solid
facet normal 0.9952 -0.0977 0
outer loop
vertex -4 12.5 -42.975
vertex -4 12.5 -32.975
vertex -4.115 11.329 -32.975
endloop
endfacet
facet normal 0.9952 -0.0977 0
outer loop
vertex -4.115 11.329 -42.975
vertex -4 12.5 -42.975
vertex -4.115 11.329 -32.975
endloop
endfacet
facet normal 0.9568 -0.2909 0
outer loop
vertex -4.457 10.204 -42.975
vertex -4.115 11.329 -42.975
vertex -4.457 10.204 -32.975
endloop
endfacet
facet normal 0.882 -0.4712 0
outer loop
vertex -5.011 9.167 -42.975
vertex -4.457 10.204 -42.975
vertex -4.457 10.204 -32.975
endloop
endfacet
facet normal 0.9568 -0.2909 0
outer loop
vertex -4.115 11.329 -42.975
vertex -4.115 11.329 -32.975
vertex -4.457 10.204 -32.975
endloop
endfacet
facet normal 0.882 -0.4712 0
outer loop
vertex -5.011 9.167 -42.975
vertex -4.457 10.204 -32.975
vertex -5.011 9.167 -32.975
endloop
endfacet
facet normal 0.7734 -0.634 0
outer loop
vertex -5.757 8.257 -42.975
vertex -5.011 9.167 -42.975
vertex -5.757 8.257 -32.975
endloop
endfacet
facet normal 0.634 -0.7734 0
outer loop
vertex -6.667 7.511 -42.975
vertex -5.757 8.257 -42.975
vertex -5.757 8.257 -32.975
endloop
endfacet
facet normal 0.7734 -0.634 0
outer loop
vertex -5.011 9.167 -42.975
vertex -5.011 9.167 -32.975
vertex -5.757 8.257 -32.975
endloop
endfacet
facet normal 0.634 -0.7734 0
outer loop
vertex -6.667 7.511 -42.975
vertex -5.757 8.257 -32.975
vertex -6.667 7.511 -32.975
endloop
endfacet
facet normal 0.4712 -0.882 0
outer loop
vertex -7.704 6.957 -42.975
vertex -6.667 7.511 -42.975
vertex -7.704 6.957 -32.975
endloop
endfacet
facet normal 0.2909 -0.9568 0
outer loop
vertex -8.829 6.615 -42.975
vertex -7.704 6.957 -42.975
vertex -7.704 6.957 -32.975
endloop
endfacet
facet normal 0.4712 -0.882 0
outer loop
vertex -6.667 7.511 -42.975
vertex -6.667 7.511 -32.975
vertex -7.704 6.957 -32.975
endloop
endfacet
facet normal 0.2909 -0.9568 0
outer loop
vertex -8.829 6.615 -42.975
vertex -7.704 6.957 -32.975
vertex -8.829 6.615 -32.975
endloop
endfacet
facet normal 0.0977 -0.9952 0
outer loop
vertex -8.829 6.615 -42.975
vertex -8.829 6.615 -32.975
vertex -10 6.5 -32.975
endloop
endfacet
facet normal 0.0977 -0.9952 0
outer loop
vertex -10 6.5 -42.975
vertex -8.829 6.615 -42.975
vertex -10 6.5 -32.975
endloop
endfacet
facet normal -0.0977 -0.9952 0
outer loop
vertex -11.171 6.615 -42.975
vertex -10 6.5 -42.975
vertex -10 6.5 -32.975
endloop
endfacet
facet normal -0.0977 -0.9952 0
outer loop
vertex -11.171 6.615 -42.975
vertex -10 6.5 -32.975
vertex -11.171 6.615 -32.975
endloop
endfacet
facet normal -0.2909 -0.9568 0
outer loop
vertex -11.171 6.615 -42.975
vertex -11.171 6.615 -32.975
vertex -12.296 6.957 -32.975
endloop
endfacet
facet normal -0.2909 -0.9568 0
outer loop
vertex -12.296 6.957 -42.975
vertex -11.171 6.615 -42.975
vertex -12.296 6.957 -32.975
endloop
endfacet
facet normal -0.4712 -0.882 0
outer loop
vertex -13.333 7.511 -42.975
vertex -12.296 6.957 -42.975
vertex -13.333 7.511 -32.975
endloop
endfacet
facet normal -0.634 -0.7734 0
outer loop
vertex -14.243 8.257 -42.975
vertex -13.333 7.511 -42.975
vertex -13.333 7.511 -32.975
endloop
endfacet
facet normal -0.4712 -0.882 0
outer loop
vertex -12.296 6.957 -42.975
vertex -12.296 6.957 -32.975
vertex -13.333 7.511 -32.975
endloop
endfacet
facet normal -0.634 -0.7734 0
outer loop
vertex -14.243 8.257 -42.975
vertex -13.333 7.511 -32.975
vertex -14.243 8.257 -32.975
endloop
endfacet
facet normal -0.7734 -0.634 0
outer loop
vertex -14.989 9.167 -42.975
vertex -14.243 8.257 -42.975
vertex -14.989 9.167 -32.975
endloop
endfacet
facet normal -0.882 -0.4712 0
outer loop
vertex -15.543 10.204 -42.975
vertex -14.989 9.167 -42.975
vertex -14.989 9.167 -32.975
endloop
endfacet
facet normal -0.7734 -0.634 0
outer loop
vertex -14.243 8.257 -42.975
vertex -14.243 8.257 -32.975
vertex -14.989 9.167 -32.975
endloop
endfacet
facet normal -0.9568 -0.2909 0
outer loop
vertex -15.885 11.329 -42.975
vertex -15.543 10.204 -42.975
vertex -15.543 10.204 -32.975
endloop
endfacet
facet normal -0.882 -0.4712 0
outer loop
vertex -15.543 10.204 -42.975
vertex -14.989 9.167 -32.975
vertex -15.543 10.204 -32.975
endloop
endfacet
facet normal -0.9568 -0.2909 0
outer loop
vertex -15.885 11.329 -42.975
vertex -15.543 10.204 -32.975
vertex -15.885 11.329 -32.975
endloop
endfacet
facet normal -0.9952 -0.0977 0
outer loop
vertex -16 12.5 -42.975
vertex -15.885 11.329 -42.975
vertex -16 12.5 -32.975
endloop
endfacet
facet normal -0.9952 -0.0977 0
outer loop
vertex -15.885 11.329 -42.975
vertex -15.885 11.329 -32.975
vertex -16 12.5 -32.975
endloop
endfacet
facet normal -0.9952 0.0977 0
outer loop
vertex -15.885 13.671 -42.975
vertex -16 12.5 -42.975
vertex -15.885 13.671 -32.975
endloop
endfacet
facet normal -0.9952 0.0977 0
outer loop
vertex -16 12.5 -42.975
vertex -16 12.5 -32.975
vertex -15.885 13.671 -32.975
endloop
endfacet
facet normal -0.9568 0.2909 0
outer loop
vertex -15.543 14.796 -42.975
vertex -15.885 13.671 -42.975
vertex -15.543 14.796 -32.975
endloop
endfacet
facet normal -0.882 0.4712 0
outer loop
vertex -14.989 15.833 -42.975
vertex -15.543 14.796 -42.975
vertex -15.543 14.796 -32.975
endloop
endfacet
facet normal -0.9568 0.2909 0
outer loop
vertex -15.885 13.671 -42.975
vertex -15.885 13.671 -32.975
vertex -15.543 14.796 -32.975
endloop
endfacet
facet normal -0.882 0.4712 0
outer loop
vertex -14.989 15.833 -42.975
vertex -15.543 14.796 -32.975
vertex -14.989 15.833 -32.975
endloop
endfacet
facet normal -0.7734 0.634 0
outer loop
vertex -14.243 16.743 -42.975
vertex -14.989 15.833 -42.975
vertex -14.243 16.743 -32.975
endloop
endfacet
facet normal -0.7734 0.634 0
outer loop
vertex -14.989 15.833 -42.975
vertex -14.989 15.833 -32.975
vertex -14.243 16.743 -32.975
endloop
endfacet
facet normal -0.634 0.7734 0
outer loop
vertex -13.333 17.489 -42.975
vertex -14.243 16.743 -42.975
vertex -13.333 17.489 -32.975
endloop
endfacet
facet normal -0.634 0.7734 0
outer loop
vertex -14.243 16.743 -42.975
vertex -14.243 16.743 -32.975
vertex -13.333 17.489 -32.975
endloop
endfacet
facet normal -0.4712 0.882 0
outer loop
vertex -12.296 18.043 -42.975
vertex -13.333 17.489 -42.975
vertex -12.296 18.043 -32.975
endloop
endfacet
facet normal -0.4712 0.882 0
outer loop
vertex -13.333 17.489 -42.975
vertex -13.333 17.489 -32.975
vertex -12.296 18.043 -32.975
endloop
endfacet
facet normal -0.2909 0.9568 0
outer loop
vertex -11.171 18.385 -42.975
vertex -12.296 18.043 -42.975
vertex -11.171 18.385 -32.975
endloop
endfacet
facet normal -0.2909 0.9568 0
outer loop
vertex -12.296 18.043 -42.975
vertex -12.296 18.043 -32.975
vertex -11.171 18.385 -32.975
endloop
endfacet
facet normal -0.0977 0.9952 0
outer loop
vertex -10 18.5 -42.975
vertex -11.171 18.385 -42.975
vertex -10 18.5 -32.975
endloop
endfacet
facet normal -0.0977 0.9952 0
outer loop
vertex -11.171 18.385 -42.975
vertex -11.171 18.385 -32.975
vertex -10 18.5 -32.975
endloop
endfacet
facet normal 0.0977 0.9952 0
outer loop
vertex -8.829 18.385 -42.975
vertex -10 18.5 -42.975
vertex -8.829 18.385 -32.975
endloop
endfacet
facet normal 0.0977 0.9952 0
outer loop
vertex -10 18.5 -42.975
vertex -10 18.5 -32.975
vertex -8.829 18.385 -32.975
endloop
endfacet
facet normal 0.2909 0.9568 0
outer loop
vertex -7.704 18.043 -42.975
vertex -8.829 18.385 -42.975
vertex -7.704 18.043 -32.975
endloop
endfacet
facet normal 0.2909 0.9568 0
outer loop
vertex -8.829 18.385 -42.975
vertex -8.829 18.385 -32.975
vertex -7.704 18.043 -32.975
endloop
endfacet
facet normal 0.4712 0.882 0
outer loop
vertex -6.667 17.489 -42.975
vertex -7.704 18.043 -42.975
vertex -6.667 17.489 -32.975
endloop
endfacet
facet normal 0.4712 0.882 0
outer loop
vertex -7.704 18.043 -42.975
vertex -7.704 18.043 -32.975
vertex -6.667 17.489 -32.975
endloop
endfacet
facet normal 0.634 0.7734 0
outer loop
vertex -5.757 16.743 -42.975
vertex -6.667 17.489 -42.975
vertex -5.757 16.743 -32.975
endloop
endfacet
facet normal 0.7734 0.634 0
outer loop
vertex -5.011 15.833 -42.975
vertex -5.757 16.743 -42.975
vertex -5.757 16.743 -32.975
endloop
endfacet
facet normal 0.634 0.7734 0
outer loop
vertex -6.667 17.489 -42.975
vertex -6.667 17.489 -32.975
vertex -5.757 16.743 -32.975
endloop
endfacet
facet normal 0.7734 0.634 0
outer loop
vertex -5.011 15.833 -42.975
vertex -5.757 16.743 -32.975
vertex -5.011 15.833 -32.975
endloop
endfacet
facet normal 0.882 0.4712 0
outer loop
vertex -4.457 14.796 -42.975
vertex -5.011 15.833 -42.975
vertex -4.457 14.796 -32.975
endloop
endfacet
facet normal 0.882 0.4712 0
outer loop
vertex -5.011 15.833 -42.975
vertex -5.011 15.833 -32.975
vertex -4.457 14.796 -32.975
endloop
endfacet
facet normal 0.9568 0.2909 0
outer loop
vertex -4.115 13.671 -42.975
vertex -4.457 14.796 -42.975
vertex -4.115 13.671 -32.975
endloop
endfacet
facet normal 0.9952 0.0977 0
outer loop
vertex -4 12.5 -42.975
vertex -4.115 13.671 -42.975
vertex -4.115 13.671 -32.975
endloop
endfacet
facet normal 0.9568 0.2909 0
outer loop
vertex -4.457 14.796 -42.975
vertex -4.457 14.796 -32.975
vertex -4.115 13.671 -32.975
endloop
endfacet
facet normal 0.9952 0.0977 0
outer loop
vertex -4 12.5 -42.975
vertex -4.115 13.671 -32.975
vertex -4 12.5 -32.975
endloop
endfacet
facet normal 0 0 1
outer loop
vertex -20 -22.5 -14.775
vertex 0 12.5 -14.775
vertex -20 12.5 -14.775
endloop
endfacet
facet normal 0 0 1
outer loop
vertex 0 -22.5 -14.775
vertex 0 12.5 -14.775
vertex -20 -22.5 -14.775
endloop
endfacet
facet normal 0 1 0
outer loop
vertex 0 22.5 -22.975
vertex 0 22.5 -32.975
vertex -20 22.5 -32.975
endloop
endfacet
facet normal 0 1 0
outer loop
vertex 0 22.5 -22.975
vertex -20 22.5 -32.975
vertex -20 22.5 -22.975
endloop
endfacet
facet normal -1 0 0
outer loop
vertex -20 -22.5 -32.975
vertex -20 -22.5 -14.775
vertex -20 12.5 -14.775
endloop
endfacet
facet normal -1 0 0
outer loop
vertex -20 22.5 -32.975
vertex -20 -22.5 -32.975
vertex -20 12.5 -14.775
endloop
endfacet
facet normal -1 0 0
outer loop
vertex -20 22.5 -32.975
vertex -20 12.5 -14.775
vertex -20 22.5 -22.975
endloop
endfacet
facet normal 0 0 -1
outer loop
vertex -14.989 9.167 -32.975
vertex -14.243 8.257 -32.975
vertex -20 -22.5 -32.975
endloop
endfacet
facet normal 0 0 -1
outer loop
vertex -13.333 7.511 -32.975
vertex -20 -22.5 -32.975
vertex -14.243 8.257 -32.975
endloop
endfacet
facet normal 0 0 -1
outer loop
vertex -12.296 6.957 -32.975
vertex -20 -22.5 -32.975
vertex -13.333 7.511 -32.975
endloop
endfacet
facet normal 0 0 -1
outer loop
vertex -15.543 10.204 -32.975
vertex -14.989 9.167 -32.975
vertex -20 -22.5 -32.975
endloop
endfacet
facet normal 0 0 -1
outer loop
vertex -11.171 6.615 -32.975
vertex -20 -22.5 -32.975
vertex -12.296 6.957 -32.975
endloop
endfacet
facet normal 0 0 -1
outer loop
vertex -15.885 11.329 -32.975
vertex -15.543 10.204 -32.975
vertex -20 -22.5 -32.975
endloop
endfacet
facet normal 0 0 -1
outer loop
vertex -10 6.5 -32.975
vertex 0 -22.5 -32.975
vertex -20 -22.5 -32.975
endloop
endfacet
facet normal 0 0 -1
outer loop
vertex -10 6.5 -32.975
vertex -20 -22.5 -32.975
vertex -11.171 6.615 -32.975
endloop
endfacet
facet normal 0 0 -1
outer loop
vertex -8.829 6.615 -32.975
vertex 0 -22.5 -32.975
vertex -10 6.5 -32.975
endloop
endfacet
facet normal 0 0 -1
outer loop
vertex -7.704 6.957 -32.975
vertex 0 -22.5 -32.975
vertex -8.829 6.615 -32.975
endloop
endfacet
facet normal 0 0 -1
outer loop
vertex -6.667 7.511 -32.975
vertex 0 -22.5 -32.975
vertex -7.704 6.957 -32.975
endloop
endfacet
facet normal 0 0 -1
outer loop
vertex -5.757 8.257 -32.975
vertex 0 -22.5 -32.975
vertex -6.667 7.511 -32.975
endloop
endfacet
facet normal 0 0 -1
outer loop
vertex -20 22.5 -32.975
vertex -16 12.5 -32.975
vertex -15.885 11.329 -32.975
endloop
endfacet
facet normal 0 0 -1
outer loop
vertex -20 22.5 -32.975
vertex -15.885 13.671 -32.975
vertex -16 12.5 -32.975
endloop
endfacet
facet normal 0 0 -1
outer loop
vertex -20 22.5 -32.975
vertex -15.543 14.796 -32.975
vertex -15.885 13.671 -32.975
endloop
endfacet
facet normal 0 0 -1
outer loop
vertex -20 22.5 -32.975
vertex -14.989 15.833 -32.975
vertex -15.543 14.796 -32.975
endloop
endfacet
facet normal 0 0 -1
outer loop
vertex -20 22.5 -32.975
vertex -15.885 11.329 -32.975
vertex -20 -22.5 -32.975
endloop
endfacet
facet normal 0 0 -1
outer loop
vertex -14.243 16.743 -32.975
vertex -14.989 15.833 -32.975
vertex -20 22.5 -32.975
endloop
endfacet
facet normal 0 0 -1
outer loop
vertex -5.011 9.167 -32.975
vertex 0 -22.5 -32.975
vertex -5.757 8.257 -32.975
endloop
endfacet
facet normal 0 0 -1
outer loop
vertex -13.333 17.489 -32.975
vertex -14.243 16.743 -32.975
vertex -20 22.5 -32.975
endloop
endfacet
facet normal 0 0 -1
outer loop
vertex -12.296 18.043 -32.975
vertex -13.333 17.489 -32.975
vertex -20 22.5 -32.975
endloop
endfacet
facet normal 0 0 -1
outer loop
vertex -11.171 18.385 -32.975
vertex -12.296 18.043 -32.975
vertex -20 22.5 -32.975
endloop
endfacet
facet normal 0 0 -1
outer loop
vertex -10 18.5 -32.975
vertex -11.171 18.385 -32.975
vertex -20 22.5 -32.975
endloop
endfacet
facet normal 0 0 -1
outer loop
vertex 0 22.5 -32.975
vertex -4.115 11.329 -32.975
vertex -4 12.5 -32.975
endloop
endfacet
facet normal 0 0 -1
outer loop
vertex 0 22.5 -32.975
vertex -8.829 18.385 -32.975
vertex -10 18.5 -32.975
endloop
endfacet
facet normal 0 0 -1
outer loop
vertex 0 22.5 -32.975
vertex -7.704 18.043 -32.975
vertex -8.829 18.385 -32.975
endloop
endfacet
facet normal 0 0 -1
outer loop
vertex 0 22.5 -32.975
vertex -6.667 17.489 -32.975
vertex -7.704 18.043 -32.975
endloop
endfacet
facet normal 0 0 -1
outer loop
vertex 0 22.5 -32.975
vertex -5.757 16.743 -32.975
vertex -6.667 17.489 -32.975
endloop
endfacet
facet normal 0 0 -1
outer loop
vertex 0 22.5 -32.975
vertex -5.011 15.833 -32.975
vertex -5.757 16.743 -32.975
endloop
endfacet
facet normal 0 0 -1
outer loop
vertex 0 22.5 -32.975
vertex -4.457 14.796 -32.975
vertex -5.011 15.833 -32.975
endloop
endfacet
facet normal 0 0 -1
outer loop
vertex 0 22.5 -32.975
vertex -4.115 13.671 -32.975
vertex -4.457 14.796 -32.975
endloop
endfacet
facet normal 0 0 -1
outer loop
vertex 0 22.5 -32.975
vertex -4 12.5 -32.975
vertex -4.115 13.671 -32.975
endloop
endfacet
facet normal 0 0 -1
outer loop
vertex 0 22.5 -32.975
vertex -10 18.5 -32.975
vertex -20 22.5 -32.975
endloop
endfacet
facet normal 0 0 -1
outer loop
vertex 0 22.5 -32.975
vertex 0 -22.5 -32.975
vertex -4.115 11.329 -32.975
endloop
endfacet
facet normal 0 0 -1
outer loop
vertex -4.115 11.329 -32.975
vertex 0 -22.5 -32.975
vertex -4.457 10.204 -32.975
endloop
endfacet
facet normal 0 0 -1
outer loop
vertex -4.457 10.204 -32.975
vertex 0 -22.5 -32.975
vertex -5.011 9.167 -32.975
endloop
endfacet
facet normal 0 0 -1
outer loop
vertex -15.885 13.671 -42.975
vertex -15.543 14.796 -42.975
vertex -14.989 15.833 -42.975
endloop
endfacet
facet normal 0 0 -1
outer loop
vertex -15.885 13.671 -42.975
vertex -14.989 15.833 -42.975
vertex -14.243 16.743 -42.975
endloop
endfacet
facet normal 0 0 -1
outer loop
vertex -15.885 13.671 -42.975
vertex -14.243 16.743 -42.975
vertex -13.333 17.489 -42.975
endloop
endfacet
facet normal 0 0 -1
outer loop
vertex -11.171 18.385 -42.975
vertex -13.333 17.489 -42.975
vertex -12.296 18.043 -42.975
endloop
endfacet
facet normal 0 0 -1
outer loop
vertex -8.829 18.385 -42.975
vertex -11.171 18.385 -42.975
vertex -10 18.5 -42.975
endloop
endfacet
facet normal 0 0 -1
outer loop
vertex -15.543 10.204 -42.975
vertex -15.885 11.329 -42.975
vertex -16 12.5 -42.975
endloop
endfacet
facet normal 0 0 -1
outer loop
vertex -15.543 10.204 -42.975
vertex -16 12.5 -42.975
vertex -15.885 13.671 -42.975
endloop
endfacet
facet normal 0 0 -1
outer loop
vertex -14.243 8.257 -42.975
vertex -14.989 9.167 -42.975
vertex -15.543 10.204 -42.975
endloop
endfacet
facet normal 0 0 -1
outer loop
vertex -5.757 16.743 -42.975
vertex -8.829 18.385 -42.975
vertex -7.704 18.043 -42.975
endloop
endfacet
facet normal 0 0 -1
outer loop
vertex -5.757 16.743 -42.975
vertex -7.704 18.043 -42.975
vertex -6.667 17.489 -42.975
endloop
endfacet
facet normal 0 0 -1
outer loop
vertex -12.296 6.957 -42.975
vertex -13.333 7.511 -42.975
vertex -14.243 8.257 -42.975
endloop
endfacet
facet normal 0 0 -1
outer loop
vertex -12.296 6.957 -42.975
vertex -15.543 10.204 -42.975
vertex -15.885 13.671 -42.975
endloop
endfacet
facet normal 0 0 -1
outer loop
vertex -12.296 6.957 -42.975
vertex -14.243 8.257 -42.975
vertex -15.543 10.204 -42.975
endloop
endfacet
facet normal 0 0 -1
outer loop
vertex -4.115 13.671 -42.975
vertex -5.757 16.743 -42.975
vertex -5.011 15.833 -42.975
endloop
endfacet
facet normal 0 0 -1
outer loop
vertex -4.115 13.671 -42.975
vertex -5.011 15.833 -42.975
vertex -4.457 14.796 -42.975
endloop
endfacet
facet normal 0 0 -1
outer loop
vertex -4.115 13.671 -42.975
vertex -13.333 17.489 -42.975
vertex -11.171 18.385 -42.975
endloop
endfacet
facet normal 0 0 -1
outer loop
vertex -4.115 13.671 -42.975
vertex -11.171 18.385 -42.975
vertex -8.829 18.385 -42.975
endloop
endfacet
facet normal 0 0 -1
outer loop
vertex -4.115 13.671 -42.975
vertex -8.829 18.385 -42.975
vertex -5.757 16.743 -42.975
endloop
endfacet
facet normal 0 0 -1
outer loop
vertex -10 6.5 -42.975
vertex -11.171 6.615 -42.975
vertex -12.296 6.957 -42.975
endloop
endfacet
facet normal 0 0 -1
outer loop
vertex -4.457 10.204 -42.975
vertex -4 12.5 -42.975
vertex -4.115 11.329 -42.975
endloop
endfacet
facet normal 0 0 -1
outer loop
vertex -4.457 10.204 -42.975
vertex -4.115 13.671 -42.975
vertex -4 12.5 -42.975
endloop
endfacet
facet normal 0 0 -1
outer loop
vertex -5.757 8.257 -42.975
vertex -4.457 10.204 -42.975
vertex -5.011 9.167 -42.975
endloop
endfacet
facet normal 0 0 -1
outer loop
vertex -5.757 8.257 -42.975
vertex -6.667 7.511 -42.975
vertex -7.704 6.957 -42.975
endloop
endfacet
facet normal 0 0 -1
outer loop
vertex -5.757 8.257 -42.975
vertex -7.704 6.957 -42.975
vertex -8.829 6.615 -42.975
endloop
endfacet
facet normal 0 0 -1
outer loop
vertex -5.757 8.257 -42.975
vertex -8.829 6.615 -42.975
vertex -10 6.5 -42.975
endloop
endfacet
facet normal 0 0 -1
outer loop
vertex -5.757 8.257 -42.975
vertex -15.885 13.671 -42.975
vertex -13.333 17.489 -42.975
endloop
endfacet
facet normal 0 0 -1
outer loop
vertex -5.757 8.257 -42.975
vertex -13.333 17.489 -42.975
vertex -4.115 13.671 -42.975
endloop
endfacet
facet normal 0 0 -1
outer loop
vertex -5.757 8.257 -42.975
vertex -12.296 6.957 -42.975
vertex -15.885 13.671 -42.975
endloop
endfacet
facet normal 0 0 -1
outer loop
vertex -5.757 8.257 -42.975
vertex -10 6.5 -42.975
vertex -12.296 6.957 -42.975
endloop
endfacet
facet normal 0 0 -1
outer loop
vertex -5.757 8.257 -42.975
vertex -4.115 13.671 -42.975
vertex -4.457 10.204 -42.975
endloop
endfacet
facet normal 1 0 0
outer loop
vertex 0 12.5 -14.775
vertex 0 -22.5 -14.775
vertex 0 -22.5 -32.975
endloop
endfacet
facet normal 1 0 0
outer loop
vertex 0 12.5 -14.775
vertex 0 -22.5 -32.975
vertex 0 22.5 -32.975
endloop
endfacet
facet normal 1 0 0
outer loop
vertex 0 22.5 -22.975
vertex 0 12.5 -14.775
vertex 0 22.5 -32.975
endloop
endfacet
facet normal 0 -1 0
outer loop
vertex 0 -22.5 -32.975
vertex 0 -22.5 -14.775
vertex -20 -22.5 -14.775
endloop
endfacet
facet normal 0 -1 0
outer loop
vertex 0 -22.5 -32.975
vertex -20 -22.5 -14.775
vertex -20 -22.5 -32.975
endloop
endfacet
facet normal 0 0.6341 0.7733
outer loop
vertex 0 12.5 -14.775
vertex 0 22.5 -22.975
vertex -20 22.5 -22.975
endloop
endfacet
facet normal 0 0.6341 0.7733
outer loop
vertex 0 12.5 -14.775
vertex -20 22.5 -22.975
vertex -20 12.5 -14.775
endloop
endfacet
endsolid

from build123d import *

# Parameters (mm, degrees)
F1_DEPTH = 20
F2_R     = 6
F3_DEPTH = 10


with BuildPart() as f1:
    # F0 (on Right) → F1 (new body)
    with BuildSketch(Plane.YZ):
        Polygon((12.5, -14.775001), (-22.5, -14.775001), (-22.5, -32.975001), (22.5, -32.975001), (22.5, -22.975001), align=None)
    extrude(amount=-F1_DEPTH)

    # F2 (on face) → F3 (join)
    with BuildSketch(Plane(origin=(0, 0, -32.975001), x_dir=(1, 0, 0), z_dir=(0, 0, -1))):
        with Locations((-10, -12.5)):
            Circle(F2_R)
    extrude(amount=F3_DEPTH)


solid = f1.part
